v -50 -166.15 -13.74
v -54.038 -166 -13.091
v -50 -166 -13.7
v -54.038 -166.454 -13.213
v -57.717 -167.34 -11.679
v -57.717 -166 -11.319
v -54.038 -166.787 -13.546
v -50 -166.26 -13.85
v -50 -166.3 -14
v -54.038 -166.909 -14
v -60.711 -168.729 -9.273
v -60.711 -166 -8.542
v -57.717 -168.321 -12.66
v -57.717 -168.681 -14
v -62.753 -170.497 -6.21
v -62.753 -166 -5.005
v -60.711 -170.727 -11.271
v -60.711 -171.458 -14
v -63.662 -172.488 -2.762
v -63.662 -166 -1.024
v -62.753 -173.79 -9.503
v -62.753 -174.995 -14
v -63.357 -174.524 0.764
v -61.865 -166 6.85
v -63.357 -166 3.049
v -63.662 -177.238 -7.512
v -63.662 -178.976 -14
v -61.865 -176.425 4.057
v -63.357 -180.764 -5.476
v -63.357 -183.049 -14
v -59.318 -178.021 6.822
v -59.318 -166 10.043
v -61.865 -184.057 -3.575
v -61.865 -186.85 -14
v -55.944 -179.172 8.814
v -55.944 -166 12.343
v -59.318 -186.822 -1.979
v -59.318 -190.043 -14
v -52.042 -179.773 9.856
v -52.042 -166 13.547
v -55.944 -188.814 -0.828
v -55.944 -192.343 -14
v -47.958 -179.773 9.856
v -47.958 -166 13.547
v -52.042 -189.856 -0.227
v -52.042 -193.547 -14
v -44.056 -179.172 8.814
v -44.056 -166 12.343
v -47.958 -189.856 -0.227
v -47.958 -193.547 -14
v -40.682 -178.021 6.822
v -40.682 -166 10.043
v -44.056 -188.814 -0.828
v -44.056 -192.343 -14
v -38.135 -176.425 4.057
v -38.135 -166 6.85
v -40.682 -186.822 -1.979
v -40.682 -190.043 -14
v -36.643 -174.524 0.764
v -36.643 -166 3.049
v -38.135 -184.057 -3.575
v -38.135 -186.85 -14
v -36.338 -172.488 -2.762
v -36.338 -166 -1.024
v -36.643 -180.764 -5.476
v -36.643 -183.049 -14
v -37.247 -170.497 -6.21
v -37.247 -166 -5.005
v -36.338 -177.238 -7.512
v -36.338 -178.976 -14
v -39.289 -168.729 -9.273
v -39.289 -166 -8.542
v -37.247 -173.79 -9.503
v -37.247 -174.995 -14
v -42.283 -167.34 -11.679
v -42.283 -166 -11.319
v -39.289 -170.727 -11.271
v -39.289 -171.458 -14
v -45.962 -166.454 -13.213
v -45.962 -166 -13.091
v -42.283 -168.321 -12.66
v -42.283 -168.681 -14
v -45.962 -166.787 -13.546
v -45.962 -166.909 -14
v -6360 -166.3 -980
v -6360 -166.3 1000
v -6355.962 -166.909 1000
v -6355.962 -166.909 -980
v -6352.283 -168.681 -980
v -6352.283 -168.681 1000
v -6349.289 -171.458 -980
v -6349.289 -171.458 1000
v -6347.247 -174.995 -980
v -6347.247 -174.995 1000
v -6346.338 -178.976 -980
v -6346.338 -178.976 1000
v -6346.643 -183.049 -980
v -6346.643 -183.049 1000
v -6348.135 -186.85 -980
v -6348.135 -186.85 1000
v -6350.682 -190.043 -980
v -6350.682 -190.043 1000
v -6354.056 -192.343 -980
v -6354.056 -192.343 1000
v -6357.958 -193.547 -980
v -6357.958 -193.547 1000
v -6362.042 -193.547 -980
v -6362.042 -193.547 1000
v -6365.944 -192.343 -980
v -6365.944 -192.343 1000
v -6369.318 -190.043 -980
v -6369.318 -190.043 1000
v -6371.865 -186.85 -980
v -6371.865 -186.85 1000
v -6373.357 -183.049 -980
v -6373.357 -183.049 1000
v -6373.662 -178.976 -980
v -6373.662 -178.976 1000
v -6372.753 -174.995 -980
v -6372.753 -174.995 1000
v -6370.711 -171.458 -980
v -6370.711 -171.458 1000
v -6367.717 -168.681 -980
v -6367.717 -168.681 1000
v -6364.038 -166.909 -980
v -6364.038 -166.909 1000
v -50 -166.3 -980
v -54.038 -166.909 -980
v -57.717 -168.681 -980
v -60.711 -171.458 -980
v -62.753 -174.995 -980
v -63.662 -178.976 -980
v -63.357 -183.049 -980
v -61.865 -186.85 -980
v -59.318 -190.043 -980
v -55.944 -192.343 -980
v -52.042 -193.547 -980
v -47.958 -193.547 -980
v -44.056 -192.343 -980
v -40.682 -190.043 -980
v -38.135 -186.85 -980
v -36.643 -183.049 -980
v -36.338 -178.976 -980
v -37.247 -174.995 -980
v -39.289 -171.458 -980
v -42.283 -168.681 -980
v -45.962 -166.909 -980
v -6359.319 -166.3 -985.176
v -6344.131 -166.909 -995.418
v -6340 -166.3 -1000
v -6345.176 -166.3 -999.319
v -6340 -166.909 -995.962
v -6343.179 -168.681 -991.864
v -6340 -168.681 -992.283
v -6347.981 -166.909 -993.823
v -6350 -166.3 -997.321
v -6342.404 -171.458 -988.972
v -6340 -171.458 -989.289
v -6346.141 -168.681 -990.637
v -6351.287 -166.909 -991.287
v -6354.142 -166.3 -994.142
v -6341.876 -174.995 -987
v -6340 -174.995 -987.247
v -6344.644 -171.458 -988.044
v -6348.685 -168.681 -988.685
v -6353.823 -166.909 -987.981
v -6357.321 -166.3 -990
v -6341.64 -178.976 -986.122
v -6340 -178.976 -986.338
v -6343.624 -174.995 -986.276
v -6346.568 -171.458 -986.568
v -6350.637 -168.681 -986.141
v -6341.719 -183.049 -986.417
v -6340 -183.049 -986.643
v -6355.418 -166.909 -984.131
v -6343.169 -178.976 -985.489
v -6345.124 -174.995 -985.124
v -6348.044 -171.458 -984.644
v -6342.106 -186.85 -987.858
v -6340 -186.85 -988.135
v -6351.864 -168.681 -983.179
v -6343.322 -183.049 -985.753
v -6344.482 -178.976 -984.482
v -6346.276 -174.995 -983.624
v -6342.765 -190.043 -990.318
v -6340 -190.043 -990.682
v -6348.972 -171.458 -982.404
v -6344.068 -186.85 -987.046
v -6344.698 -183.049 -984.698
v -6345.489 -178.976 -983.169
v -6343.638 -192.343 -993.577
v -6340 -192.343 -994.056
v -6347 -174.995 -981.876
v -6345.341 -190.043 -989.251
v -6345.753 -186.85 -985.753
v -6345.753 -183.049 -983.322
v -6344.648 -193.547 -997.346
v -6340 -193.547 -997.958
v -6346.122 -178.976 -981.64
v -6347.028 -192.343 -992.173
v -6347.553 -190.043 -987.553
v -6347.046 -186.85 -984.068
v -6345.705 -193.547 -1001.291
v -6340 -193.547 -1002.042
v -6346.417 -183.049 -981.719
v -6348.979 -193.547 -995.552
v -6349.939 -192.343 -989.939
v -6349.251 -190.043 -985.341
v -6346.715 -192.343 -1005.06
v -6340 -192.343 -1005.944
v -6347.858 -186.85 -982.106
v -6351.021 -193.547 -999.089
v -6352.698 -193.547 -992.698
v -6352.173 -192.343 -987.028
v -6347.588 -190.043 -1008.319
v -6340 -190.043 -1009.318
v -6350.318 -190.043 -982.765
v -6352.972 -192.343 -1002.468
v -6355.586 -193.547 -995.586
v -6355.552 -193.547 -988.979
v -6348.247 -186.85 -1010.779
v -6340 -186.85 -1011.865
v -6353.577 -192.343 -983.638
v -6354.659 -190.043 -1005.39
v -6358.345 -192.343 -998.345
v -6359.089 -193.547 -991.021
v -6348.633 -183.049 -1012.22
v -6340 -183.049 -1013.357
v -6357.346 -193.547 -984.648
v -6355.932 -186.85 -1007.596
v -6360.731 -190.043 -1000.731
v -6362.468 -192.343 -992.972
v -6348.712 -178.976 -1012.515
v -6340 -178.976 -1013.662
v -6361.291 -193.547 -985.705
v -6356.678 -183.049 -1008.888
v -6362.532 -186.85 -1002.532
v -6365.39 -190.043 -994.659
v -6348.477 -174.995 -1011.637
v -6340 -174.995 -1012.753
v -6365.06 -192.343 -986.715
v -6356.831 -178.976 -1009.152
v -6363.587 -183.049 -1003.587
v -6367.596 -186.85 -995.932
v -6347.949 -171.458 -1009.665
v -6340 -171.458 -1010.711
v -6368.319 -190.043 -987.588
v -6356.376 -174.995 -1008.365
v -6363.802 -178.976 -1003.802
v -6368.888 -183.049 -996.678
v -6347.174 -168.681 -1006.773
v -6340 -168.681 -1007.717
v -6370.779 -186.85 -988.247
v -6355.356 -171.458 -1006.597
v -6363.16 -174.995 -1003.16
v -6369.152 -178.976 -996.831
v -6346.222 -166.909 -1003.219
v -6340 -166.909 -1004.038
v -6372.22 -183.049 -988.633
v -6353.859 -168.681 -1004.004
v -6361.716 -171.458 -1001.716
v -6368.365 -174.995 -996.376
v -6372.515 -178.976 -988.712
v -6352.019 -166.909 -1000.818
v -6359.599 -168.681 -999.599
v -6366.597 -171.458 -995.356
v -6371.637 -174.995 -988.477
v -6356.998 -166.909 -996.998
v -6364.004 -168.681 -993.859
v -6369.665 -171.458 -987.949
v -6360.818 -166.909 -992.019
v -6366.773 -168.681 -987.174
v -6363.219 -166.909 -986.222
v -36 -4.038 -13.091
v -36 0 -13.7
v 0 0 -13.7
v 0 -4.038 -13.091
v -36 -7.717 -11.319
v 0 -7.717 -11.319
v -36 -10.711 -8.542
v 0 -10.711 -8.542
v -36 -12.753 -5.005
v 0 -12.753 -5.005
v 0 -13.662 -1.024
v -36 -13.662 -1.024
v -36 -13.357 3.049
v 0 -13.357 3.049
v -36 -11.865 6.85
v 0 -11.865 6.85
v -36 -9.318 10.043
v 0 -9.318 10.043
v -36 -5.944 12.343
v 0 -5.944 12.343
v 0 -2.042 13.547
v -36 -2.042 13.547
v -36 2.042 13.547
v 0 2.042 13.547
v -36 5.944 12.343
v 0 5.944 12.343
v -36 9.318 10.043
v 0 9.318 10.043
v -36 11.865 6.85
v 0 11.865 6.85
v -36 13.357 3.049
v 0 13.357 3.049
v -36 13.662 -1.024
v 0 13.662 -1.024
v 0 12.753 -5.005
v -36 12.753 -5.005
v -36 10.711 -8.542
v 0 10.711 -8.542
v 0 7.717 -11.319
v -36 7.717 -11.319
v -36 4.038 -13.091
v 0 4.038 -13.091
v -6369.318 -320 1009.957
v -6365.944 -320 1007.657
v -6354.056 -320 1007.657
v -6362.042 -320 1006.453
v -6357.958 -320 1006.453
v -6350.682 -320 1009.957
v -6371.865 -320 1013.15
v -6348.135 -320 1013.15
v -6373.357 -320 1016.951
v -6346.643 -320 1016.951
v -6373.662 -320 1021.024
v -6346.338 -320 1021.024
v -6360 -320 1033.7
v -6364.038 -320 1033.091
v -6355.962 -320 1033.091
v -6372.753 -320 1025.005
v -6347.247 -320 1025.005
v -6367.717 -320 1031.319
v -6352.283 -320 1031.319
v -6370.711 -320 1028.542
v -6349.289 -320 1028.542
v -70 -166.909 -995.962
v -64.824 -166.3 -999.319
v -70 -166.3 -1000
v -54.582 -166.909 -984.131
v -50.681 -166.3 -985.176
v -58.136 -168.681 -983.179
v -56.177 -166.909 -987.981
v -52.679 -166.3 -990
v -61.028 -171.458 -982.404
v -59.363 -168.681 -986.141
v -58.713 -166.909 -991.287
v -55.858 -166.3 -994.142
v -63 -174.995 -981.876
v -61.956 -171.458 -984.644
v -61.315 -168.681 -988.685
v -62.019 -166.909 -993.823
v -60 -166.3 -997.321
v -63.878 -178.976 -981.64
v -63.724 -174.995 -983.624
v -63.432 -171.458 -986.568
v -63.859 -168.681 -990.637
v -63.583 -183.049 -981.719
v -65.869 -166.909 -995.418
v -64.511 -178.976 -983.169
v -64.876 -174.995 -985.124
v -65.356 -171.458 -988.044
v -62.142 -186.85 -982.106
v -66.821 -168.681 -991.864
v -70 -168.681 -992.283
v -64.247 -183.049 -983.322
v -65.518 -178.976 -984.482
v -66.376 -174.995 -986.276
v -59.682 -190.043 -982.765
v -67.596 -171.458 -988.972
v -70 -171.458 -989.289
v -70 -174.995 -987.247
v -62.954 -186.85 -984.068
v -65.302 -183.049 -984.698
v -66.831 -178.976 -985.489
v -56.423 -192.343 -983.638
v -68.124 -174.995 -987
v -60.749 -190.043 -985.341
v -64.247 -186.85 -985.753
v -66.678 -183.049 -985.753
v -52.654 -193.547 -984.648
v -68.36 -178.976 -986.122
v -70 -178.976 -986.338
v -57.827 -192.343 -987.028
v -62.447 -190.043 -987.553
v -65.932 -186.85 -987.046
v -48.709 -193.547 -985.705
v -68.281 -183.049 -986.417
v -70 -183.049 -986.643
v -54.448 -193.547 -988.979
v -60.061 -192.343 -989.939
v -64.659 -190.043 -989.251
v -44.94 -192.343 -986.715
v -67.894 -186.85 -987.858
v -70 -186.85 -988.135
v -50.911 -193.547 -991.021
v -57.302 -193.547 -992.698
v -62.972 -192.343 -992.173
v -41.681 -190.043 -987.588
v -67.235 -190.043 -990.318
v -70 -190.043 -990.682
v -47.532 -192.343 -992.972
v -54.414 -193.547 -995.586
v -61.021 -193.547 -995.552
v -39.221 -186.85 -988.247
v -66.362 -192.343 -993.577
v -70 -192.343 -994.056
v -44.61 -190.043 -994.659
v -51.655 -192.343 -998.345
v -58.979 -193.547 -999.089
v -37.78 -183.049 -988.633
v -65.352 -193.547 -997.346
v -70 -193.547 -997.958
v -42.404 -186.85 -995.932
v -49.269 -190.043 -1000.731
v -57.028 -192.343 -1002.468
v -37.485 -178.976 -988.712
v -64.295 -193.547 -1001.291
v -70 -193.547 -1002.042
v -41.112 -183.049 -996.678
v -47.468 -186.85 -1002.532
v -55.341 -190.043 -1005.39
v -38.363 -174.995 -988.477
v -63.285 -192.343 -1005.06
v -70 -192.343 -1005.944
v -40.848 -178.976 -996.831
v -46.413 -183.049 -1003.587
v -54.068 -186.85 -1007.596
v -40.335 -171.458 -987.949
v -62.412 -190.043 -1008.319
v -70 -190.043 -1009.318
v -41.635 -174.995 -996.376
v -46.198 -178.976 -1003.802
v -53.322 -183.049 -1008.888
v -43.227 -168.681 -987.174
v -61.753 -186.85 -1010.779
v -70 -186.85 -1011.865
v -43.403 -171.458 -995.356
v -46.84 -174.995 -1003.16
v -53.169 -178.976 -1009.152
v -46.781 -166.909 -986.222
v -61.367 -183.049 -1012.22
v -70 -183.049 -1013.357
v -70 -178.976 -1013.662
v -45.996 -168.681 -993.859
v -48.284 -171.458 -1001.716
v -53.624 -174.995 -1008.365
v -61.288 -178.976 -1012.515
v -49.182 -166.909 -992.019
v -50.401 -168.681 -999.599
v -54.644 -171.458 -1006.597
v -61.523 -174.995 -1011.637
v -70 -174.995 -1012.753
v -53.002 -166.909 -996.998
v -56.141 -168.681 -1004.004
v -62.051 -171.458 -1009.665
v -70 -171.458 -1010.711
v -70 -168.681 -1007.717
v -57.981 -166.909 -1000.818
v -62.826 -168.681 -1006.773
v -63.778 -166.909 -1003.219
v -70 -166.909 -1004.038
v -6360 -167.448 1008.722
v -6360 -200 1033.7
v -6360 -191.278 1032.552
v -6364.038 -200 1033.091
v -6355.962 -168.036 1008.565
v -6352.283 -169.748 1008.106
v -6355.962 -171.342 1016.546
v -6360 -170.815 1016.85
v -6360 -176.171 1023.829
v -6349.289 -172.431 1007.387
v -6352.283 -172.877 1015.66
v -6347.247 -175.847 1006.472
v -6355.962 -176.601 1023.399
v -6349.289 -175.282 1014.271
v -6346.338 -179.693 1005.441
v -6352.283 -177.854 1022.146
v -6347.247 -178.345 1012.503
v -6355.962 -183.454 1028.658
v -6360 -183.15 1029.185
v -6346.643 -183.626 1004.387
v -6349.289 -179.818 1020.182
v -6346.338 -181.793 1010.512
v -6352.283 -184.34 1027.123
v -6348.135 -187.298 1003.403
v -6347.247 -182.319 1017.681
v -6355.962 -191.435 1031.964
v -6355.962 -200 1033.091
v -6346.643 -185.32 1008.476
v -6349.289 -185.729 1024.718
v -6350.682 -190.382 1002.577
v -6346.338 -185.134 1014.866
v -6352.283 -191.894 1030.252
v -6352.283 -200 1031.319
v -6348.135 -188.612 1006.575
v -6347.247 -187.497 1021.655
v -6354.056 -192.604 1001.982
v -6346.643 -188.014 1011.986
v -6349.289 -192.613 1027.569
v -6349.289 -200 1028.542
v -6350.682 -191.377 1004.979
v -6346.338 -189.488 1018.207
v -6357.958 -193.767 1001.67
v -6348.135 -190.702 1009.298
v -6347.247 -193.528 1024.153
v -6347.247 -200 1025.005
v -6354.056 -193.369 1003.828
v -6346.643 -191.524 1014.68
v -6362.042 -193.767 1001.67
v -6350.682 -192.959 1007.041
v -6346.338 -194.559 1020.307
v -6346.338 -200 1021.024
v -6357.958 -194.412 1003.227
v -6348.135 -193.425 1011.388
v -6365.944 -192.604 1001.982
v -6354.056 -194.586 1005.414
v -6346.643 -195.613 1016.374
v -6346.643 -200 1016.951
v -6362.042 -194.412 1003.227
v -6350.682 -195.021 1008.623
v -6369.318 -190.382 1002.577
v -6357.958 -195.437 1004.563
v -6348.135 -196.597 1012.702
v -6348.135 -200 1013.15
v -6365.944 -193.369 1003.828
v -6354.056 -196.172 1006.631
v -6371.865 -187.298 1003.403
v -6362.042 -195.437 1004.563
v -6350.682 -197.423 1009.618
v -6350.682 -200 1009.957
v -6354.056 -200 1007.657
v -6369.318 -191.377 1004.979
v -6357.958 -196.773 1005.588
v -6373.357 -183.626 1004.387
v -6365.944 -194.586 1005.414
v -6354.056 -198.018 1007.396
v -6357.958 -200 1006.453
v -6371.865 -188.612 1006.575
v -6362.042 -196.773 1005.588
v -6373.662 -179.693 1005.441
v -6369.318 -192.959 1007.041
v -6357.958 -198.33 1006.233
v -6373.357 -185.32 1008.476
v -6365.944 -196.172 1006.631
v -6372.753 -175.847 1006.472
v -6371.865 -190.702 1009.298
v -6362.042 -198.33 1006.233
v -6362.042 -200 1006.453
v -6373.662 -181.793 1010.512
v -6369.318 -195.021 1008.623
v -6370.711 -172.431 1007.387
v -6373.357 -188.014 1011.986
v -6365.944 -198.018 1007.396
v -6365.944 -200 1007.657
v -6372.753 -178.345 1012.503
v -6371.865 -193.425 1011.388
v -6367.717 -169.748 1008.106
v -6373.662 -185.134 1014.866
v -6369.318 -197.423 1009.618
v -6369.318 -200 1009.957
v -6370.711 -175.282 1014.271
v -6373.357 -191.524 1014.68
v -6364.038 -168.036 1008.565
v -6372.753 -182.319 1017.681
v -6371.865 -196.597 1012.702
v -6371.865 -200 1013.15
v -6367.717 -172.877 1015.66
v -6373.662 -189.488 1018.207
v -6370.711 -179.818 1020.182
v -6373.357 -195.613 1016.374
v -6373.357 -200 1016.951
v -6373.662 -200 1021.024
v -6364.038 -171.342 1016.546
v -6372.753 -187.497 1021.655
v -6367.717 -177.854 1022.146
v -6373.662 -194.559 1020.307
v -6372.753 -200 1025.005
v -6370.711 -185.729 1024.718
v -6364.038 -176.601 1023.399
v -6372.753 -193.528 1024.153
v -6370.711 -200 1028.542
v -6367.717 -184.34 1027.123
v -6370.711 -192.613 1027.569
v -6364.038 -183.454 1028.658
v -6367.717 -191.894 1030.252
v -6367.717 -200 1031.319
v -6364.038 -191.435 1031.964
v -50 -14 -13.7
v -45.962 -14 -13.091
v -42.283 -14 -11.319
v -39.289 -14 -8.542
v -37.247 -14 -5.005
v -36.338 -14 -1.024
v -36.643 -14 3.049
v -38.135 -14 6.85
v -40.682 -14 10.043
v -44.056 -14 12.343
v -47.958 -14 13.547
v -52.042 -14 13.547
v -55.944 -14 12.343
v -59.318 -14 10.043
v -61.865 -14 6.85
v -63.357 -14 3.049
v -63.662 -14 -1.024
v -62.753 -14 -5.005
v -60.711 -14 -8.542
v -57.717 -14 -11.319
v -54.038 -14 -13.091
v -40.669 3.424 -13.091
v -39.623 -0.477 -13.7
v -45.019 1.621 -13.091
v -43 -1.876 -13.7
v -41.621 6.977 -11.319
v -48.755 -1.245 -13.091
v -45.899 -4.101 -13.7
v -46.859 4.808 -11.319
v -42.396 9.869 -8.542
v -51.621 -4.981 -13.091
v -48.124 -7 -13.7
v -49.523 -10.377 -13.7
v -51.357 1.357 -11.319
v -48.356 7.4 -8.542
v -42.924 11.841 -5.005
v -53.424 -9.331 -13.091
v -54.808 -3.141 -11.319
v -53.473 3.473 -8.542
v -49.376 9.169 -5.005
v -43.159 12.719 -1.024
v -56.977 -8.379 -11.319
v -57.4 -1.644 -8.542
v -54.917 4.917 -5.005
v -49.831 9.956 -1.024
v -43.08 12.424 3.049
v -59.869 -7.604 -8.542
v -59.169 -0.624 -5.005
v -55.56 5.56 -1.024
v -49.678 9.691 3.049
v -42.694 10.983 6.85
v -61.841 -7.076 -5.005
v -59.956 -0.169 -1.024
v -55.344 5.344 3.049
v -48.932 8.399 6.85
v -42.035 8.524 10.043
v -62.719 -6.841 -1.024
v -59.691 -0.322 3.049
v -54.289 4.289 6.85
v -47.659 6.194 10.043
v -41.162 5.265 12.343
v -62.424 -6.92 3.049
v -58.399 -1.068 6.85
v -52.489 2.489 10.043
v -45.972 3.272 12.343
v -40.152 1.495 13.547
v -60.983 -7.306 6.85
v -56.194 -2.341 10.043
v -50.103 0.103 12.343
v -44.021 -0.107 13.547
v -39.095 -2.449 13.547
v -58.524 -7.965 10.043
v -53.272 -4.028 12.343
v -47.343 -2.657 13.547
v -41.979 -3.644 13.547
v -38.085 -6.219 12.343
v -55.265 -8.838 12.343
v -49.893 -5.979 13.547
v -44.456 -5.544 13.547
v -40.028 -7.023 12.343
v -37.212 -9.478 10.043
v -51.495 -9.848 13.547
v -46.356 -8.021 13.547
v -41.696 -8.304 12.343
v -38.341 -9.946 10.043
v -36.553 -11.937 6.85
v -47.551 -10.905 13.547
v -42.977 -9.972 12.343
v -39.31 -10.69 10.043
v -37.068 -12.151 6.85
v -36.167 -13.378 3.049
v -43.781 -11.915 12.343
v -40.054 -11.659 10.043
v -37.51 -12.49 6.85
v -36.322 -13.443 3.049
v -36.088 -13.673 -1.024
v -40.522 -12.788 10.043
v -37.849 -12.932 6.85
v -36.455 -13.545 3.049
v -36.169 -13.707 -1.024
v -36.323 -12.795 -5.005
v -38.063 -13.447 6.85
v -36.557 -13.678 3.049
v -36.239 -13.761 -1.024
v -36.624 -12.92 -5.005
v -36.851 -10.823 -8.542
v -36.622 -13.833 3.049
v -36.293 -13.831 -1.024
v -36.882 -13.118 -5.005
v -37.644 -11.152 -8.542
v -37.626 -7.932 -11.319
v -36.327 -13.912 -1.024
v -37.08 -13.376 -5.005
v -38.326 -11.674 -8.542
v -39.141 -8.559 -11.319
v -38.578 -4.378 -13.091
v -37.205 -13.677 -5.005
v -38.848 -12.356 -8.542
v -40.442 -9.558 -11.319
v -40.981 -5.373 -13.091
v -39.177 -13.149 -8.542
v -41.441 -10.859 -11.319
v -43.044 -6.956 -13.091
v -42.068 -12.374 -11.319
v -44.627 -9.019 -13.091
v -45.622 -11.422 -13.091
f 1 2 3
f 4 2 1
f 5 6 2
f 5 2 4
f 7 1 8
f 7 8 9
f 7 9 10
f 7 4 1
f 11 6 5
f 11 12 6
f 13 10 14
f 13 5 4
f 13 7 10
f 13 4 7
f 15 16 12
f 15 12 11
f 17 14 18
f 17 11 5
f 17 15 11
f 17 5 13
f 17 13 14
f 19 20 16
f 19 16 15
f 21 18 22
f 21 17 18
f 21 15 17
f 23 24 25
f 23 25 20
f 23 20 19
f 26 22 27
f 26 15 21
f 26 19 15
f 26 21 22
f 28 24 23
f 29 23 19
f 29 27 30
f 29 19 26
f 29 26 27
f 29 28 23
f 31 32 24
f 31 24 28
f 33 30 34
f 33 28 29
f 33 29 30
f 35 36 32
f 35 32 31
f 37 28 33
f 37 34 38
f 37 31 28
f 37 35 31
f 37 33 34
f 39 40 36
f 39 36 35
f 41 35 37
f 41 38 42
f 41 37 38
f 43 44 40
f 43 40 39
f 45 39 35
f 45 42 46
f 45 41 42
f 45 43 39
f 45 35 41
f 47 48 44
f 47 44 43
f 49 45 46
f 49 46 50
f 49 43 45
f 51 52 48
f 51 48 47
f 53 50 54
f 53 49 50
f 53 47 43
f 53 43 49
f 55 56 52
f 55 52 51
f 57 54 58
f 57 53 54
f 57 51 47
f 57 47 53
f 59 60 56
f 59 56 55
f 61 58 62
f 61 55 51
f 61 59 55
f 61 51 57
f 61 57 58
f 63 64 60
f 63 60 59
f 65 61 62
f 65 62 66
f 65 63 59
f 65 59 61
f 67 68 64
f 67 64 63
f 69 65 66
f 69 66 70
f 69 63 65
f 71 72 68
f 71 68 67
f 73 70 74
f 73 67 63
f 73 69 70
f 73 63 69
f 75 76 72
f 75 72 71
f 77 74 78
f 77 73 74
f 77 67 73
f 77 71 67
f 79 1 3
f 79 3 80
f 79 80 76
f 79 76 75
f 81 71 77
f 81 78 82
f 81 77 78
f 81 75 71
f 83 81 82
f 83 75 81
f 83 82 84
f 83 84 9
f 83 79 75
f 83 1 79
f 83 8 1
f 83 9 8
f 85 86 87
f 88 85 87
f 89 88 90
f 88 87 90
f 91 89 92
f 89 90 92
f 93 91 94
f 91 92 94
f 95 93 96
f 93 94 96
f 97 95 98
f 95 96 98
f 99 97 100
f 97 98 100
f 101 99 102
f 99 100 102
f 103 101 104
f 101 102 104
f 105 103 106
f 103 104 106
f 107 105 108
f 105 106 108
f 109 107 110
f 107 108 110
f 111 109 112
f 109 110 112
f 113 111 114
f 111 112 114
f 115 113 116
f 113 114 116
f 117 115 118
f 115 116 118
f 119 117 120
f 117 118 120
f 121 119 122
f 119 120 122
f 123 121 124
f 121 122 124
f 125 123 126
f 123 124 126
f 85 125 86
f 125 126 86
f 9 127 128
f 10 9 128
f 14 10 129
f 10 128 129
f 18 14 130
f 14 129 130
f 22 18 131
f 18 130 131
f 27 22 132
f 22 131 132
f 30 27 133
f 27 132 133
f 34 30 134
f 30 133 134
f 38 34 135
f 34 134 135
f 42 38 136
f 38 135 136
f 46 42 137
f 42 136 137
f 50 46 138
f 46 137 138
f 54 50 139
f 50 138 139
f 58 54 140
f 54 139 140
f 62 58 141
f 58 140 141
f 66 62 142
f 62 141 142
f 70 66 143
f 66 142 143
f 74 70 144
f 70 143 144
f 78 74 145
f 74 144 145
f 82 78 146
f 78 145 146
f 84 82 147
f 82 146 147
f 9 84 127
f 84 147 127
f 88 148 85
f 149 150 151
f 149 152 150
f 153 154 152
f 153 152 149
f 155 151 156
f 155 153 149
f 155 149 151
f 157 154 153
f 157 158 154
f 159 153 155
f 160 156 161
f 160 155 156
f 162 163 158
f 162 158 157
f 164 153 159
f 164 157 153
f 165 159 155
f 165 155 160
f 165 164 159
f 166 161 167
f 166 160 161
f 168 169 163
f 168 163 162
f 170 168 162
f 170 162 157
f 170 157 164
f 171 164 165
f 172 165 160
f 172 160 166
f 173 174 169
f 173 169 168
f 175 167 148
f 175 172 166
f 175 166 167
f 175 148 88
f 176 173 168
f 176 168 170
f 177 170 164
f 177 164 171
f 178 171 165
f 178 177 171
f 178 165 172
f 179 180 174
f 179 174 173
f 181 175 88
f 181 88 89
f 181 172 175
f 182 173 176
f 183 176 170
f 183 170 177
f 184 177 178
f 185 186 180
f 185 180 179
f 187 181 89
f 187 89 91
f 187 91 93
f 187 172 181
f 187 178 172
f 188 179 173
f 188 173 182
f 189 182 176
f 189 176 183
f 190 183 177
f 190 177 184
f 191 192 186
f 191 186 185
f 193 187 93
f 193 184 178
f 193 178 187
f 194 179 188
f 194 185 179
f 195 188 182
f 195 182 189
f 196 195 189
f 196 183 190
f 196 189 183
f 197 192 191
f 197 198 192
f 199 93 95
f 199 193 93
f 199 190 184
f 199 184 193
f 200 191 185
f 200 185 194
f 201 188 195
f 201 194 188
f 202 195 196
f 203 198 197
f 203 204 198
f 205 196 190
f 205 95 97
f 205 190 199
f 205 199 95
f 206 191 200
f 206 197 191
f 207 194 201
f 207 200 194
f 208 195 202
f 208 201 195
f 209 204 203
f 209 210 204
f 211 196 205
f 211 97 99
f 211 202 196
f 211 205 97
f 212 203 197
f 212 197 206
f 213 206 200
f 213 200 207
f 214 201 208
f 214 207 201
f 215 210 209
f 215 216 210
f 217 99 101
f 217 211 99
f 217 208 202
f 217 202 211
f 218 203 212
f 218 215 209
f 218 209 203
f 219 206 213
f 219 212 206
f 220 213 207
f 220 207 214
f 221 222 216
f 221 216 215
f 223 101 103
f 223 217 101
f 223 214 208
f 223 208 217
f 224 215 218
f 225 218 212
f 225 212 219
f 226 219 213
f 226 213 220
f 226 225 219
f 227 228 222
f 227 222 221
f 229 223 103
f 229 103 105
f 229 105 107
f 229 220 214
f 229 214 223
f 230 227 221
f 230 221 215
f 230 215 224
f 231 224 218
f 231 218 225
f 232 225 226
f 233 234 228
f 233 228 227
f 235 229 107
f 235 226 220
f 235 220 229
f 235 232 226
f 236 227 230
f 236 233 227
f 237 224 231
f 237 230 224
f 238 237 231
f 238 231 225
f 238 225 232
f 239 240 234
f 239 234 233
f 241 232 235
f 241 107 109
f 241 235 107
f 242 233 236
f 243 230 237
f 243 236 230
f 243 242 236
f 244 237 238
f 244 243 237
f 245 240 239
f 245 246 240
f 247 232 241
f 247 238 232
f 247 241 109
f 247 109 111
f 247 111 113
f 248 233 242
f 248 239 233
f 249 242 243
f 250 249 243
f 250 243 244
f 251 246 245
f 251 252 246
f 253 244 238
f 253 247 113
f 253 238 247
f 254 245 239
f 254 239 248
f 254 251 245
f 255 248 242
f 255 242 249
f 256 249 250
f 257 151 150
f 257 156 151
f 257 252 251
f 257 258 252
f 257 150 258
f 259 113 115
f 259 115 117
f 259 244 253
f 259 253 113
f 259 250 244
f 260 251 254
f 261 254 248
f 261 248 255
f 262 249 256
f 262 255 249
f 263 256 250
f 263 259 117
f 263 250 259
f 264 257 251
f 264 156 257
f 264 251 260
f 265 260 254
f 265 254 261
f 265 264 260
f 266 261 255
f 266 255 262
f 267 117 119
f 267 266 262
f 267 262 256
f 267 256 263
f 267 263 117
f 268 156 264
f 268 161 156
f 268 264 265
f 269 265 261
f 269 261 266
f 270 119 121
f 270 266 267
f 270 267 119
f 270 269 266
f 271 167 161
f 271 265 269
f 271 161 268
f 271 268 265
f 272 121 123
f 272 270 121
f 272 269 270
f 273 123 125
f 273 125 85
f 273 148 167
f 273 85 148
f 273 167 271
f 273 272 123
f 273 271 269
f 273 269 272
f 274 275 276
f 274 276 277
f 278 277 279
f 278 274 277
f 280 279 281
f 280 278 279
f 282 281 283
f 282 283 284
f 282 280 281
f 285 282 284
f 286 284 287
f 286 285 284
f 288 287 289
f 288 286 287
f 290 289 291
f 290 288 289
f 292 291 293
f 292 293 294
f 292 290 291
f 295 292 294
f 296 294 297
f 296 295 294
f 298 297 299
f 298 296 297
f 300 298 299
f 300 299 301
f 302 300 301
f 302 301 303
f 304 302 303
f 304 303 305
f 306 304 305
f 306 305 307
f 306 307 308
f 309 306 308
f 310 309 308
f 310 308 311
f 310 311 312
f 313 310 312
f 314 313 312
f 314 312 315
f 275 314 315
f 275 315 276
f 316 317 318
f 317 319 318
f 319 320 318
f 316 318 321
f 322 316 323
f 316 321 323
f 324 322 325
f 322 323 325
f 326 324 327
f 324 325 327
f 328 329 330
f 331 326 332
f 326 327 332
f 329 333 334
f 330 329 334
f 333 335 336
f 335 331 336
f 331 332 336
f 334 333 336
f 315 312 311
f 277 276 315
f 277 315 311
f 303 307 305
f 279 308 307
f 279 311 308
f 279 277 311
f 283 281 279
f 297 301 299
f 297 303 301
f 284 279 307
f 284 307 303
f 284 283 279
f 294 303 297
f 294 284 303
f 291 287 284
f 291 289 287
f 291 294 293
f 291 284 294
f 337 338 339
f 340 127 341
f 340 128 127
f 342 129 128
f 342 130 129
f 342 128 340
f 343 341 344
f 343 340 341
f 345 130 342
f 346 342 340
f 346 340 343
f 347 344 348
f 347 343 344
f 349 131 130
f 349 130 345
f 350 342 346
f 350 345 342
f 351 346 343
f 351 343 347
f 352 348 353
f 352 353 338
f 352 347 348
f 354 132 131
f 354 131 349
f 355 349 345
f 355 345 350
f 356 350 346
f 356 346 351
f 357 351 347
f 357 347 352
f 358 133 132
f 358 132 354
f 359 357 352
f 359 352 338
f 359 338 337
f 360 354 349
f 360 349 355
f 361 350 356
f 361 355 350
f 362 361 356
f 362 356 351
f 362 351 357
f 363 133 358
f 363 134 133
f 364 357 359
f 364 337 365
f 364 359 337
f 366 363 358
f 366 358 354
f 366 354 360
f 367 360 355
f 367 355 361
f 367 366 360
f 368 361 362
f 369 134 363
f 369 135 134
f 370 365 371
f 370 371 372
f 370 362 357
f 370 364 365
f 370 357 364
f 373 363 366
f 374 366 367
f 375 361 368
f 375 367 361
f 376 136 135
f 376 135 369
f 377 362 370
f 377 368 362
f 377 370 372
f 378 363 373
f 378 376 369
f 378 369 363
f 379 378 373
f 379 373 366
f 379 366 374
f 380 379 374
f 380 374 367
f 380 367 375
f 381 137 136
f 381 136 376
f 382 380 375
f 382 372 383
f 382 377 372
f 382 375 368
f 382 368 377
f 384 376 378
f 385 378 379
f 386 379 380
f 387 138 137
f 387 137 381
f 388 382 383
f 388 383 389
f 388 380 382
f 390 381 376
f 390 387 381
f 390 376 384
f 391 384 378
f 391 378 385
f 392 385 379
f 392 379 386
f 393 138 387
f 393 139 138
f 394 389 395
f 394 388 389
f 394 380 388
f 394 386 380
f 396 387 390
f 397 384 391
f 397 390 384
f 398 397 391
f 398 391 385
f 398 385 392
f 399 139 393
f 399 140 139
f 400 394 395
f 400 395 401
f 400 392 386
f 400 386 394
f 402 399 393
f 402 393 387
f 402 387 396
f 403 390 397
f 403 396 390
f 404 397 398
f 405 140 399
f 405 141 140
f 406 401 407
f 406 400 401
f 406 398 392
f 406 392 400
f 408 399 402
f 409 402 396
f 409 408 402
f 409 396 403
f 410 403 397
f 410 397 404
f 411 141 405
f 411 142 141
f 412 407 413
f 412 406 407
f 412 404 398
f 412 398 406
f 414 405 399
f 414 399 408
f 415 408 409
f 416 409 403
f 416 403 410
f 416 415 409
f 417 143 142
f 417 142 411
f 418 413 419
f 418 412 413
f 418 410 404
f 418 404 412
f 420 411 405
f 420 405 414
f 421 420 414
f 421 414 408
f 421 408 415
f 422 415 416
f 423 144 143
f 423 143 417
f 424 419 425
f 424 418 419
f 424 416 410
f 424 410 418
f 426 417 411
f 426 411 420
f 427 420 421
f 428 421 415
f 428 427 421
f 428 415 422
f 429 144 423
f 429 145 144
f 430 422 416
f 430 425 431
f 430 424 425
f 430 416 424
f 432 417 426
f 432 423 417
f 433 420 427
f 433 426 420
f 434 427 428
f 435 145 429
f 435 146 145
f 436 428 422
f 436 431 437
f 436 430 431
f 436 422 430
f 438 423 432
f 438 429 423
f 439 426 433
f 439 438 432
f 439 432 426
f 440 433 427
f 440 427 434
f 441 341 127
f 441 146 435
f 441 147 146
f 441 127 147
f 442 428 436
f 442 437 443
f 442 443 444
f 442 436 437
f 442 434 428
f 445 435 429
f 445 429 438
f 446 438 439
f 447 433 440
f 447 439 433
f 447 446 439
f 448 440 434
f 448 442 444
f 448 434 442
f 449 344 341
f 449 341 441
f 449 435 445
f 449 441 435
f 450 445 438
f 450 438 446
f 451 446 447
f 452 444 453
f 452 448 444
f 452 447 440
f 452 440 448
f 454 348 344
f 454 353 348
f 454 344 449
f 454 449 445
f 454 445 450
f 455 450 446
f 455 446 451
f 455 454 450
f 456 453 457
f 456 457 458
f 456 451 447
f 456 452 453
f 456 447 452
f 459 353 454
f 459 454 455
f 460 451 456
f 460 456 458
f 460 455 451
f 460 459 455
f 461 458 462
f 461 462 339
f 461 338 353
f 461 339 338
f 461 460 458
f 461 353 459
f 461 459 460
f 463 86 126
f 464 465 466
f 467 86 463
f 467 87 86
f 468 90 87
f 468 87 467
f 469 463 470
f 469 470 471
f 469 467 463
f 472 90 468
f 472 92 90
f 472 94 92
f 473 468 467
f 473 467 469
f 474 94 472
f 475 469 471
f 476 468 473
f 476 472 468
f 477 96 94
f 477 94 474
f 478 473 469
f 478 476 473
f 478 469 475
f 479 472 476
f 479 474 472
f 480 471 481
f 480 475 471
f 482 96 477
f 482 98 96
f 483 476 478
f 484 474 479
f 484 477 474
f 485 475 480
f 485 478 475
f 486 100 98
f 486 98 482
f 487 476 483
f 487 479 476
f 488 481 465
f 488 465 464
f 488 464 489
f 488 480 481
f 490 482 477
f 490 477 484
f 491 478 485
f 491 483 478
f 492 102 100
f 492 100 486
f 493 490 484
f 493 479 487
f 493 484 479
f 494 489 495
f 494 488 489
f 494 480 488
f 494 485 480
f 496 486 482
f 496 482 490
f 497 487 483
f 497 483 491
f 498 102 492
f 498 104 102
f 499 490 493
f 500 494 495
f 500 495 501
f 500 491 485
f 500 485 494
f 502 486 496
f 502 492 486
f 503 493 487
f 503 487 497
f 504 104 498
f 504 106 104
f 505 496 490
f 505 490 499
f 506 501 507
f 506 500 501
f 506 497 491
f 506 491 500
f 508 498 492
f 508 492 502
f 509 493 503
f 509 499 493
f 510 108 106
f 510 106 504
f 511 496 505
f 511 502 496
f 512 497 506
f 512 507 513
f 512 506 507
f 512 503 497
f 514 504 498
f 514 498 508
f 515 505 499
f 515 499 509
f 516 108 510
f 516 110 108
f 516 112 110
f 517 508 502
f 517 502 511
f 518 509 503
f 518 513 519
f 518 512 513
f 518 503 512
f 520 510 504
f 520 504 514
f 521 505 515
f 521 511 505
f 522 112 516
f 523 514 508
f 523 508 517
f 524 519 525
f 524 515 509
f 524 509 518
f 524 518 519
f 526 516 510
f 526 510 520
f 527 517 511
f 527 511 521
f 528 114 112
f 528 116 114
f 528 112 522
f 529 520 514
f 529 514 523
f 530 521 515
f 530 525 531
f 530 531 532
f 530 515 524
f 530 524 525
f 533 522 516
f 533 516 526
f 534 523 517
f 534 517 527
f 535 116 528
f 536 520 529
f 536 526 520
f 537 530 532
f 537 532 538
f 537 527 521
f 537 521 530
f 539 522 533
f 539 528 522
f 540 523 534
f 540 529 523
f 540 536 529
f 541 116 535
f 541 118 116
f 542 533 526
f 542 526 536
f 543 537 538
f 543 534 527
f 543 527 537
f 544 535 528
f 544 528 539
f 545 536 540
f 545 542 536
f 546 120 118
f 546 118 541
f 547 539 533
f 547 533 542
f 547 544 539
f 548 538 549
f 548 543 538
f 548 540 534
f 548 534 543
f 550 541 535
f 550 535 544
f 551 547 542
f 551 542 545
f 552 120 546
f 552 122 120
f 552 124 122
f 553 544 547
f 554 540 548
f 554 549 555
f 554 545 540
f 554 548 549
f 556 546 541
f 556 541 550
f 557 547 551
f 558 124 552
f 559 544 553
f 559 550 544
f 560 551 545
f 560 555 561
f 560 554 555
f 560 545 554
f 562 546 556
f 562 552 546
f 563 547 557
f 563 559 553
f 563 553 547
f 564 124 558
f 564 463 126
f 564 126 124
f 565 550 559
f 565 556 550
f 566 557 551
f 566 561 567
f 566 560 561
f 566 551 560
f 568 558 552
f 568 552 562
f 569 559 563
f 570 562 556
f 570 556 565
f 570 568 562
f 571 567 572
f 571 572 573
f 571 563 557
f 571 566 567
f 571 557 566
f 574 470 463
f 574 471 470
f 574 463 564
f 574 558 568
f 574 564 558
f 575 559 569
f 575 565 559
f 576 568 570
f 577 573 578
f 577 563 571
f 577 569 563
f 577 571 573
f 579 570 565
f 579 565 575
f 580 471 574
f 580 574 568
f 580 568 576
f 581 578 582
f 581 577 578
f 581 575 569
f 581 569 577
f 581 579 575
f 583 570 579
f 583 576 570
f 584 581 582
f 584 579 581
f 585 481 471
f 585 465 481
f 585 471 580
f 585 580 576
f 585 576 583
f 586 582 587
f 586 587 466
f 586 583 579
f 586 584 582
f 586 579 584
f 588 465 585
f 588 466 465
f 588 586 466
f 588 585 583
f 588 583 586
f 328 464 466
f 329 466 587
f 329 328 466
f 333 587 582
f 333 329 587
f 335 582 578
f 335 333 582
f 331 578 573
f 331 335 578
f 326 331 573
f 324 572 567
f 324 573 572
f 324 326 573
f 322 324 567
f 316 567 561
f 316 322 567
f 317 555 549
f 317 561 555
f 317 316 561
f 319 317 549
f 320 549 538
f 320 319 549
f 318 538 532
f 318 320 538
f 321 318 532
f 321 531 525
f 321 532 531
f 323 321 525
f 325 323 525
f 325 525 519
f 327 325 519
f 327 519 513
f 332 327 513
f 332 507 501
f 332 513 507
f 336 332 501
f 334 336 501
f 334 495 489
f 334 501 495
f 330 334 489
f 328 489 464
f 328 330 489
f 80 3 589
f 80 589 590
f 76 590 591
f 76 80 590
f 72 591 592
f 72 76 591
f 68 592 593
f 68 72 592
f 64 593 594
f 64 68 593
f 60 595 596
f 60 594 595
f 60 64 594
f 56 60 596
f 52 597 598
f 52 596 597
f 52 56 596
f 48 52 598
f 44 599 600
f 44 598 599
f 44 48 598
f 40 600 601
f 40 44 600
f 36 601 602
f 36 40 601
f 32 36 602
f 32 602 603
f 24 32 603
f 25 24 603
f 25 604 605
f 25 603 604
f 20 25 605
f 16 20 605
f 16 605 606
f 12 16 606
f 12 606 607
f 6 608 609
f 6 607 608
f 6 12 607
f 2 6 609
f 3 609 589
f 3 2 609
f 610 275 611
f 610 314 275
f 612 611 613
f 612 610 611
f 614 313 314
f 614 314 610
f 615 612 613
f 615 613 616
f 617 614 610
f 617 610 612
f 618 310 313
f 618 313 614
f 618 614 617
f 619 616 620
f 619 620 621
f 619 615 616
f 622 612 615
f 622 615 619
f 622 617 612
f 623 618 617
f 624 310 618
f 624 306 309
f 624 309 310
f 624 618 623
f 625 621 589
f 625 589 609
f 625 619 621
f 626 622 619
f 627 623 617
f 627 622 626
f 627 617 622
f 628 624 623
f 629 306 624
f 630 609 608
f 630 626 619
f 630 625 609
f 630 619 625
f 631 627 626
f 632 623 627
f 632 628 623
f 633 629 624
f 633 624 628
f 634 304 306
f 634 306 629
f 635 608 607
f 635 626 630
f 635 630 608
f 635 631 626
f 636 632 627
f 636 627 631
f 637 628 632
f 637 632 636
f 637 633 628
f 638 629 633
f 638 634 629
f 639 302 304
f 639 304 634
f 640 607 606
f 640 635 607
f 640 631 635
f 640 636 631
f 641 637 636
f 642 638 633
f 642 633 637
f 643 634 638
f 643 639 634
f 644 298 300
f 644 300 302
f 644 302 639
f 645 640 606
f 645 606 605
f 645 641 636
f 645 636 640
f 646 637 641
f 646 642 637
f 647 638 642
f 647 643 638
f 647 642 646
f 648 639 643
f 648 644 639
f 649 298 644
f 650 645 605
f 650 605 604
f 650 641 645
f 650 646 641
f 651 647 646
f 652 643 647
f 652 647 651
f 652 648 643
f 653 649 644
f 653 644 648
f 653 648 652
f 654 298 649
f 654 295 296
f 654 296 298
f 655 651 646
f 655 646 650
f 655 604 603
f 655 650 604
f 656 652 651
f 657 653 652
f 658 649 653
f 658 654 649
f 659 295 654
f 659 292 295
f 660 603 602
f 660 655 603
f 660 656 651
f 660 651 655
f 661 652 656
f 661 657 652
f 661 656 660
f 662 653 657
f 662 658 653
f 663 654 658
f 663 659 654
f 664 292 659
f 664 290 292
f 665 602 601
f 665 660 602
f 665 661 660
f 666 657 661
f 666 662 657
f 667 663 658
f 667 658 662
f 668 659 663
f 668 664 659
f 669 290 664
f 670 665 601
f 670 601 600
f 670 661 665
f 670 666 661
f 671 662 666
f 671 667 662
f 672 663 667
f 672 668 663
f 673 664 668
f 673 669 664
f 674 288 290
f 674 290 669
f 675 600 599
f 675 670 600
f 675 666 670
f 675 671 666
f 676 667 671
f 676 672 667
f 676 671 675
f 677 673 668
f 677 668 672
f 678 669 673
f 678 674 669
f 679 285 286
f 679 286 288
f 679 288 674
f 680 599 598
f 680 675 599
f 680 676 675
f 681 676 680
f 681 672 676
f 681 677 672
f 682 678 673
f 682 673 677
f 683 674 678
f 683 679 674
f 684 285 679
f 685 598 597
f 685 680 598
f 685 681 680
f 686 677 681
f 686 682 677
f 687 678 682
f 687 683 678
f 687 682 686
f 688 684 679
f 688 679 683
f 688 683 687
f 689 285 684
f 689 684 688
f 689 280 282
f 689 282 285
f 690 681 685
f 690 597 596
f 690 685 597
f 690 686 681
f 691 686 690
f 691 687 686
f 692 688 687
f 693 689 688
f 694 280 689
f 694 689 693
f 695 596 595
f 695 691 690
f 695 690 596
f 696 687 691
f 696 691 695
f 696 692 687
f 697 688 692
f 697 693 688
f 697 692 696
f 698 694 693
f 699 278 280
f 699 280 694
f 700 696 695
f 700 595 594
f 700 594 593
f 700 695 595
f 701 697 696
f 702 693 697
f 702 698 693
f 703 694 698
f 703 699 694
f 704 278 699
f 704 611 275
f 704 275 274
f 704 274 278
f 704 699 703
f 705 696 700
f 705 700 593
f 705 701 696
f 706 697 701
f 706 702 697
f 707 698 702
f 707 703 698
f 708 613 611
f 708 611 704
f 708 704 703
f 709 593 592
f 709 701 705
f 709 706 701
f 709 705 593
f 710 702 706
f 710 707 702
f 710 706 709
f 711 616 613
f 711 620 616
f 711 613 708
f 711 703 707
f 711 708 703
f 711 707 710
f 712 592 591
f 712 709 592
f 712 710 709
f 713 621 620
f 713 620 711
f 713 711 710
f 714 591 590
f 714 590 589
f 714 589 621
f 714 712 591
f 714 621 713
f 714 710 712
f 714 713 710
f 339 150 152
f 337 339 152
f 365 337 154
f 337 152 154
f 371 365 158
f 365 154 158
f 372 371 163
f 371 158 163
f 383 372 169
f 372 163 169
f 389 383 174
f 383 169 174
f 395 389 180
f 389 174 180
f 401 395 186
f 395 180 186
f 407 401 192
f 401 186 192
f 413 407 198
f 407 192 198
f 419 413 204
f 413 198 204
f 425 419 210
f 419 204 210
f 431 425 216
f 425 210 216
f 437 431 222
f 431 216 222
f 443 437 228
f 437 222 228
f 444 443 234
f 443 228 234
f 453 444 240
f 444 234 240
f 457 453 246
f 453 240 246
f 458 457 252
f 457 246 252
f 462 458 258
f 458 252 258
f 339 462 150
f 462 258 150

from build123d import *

# Parameters (mm, degrees)
CROQUIS1_R = 13.7


with BuildPart() as part:
    # Barrer1: sweep along a curve in space
    with BuildLine() as barrer1_path:
        Line((0, 0, 0), (-36, 0, 0))
        ThreePointArc((-36, 0, 0), (-45.899494937, -4.100505063, 0), (-50, -14, 0))
        Line((-50, -14, 0), (-50, -166, 0))
        ThreePointArc((-50, -166, 0), (-50, -175.899494937, -4.100505063), (-50, -180, -14))
        Line((-50, -180, -14), (-50, -180, -980))
        ThreePointArc((-50, -180, -980), (-55.857864376, -180, -994.142135624), (-70, -180, -1000))
        Line((-70, -180, -1000), (-6340, -180, -1000))
        ThreePointArc((-6340, -180, -1000), (-6354.142135624, -180, -994.142135624), (-6360, -180, -980))
        Line((-6360, -180, -980), (-6360, -180, 1000))
        ThreePointArc((-6360, -180, 1000), (-6360, -185.857864376, 1014.142135624), (-6360, -200, 1020))
        Line((-6360, -200, 1020), (-6360, -320, 1020))
    # Croquis1 → Barrer1 (sweep)
    with BuildSketch(Plane(origin=(0, 0, 0), x_dir=(0, 0, -1), z_dir=(1, 0, 0))):
        Circle(CROQUIS1_R)
    sweep(path=barrer1_path.line)


solid = part.part
